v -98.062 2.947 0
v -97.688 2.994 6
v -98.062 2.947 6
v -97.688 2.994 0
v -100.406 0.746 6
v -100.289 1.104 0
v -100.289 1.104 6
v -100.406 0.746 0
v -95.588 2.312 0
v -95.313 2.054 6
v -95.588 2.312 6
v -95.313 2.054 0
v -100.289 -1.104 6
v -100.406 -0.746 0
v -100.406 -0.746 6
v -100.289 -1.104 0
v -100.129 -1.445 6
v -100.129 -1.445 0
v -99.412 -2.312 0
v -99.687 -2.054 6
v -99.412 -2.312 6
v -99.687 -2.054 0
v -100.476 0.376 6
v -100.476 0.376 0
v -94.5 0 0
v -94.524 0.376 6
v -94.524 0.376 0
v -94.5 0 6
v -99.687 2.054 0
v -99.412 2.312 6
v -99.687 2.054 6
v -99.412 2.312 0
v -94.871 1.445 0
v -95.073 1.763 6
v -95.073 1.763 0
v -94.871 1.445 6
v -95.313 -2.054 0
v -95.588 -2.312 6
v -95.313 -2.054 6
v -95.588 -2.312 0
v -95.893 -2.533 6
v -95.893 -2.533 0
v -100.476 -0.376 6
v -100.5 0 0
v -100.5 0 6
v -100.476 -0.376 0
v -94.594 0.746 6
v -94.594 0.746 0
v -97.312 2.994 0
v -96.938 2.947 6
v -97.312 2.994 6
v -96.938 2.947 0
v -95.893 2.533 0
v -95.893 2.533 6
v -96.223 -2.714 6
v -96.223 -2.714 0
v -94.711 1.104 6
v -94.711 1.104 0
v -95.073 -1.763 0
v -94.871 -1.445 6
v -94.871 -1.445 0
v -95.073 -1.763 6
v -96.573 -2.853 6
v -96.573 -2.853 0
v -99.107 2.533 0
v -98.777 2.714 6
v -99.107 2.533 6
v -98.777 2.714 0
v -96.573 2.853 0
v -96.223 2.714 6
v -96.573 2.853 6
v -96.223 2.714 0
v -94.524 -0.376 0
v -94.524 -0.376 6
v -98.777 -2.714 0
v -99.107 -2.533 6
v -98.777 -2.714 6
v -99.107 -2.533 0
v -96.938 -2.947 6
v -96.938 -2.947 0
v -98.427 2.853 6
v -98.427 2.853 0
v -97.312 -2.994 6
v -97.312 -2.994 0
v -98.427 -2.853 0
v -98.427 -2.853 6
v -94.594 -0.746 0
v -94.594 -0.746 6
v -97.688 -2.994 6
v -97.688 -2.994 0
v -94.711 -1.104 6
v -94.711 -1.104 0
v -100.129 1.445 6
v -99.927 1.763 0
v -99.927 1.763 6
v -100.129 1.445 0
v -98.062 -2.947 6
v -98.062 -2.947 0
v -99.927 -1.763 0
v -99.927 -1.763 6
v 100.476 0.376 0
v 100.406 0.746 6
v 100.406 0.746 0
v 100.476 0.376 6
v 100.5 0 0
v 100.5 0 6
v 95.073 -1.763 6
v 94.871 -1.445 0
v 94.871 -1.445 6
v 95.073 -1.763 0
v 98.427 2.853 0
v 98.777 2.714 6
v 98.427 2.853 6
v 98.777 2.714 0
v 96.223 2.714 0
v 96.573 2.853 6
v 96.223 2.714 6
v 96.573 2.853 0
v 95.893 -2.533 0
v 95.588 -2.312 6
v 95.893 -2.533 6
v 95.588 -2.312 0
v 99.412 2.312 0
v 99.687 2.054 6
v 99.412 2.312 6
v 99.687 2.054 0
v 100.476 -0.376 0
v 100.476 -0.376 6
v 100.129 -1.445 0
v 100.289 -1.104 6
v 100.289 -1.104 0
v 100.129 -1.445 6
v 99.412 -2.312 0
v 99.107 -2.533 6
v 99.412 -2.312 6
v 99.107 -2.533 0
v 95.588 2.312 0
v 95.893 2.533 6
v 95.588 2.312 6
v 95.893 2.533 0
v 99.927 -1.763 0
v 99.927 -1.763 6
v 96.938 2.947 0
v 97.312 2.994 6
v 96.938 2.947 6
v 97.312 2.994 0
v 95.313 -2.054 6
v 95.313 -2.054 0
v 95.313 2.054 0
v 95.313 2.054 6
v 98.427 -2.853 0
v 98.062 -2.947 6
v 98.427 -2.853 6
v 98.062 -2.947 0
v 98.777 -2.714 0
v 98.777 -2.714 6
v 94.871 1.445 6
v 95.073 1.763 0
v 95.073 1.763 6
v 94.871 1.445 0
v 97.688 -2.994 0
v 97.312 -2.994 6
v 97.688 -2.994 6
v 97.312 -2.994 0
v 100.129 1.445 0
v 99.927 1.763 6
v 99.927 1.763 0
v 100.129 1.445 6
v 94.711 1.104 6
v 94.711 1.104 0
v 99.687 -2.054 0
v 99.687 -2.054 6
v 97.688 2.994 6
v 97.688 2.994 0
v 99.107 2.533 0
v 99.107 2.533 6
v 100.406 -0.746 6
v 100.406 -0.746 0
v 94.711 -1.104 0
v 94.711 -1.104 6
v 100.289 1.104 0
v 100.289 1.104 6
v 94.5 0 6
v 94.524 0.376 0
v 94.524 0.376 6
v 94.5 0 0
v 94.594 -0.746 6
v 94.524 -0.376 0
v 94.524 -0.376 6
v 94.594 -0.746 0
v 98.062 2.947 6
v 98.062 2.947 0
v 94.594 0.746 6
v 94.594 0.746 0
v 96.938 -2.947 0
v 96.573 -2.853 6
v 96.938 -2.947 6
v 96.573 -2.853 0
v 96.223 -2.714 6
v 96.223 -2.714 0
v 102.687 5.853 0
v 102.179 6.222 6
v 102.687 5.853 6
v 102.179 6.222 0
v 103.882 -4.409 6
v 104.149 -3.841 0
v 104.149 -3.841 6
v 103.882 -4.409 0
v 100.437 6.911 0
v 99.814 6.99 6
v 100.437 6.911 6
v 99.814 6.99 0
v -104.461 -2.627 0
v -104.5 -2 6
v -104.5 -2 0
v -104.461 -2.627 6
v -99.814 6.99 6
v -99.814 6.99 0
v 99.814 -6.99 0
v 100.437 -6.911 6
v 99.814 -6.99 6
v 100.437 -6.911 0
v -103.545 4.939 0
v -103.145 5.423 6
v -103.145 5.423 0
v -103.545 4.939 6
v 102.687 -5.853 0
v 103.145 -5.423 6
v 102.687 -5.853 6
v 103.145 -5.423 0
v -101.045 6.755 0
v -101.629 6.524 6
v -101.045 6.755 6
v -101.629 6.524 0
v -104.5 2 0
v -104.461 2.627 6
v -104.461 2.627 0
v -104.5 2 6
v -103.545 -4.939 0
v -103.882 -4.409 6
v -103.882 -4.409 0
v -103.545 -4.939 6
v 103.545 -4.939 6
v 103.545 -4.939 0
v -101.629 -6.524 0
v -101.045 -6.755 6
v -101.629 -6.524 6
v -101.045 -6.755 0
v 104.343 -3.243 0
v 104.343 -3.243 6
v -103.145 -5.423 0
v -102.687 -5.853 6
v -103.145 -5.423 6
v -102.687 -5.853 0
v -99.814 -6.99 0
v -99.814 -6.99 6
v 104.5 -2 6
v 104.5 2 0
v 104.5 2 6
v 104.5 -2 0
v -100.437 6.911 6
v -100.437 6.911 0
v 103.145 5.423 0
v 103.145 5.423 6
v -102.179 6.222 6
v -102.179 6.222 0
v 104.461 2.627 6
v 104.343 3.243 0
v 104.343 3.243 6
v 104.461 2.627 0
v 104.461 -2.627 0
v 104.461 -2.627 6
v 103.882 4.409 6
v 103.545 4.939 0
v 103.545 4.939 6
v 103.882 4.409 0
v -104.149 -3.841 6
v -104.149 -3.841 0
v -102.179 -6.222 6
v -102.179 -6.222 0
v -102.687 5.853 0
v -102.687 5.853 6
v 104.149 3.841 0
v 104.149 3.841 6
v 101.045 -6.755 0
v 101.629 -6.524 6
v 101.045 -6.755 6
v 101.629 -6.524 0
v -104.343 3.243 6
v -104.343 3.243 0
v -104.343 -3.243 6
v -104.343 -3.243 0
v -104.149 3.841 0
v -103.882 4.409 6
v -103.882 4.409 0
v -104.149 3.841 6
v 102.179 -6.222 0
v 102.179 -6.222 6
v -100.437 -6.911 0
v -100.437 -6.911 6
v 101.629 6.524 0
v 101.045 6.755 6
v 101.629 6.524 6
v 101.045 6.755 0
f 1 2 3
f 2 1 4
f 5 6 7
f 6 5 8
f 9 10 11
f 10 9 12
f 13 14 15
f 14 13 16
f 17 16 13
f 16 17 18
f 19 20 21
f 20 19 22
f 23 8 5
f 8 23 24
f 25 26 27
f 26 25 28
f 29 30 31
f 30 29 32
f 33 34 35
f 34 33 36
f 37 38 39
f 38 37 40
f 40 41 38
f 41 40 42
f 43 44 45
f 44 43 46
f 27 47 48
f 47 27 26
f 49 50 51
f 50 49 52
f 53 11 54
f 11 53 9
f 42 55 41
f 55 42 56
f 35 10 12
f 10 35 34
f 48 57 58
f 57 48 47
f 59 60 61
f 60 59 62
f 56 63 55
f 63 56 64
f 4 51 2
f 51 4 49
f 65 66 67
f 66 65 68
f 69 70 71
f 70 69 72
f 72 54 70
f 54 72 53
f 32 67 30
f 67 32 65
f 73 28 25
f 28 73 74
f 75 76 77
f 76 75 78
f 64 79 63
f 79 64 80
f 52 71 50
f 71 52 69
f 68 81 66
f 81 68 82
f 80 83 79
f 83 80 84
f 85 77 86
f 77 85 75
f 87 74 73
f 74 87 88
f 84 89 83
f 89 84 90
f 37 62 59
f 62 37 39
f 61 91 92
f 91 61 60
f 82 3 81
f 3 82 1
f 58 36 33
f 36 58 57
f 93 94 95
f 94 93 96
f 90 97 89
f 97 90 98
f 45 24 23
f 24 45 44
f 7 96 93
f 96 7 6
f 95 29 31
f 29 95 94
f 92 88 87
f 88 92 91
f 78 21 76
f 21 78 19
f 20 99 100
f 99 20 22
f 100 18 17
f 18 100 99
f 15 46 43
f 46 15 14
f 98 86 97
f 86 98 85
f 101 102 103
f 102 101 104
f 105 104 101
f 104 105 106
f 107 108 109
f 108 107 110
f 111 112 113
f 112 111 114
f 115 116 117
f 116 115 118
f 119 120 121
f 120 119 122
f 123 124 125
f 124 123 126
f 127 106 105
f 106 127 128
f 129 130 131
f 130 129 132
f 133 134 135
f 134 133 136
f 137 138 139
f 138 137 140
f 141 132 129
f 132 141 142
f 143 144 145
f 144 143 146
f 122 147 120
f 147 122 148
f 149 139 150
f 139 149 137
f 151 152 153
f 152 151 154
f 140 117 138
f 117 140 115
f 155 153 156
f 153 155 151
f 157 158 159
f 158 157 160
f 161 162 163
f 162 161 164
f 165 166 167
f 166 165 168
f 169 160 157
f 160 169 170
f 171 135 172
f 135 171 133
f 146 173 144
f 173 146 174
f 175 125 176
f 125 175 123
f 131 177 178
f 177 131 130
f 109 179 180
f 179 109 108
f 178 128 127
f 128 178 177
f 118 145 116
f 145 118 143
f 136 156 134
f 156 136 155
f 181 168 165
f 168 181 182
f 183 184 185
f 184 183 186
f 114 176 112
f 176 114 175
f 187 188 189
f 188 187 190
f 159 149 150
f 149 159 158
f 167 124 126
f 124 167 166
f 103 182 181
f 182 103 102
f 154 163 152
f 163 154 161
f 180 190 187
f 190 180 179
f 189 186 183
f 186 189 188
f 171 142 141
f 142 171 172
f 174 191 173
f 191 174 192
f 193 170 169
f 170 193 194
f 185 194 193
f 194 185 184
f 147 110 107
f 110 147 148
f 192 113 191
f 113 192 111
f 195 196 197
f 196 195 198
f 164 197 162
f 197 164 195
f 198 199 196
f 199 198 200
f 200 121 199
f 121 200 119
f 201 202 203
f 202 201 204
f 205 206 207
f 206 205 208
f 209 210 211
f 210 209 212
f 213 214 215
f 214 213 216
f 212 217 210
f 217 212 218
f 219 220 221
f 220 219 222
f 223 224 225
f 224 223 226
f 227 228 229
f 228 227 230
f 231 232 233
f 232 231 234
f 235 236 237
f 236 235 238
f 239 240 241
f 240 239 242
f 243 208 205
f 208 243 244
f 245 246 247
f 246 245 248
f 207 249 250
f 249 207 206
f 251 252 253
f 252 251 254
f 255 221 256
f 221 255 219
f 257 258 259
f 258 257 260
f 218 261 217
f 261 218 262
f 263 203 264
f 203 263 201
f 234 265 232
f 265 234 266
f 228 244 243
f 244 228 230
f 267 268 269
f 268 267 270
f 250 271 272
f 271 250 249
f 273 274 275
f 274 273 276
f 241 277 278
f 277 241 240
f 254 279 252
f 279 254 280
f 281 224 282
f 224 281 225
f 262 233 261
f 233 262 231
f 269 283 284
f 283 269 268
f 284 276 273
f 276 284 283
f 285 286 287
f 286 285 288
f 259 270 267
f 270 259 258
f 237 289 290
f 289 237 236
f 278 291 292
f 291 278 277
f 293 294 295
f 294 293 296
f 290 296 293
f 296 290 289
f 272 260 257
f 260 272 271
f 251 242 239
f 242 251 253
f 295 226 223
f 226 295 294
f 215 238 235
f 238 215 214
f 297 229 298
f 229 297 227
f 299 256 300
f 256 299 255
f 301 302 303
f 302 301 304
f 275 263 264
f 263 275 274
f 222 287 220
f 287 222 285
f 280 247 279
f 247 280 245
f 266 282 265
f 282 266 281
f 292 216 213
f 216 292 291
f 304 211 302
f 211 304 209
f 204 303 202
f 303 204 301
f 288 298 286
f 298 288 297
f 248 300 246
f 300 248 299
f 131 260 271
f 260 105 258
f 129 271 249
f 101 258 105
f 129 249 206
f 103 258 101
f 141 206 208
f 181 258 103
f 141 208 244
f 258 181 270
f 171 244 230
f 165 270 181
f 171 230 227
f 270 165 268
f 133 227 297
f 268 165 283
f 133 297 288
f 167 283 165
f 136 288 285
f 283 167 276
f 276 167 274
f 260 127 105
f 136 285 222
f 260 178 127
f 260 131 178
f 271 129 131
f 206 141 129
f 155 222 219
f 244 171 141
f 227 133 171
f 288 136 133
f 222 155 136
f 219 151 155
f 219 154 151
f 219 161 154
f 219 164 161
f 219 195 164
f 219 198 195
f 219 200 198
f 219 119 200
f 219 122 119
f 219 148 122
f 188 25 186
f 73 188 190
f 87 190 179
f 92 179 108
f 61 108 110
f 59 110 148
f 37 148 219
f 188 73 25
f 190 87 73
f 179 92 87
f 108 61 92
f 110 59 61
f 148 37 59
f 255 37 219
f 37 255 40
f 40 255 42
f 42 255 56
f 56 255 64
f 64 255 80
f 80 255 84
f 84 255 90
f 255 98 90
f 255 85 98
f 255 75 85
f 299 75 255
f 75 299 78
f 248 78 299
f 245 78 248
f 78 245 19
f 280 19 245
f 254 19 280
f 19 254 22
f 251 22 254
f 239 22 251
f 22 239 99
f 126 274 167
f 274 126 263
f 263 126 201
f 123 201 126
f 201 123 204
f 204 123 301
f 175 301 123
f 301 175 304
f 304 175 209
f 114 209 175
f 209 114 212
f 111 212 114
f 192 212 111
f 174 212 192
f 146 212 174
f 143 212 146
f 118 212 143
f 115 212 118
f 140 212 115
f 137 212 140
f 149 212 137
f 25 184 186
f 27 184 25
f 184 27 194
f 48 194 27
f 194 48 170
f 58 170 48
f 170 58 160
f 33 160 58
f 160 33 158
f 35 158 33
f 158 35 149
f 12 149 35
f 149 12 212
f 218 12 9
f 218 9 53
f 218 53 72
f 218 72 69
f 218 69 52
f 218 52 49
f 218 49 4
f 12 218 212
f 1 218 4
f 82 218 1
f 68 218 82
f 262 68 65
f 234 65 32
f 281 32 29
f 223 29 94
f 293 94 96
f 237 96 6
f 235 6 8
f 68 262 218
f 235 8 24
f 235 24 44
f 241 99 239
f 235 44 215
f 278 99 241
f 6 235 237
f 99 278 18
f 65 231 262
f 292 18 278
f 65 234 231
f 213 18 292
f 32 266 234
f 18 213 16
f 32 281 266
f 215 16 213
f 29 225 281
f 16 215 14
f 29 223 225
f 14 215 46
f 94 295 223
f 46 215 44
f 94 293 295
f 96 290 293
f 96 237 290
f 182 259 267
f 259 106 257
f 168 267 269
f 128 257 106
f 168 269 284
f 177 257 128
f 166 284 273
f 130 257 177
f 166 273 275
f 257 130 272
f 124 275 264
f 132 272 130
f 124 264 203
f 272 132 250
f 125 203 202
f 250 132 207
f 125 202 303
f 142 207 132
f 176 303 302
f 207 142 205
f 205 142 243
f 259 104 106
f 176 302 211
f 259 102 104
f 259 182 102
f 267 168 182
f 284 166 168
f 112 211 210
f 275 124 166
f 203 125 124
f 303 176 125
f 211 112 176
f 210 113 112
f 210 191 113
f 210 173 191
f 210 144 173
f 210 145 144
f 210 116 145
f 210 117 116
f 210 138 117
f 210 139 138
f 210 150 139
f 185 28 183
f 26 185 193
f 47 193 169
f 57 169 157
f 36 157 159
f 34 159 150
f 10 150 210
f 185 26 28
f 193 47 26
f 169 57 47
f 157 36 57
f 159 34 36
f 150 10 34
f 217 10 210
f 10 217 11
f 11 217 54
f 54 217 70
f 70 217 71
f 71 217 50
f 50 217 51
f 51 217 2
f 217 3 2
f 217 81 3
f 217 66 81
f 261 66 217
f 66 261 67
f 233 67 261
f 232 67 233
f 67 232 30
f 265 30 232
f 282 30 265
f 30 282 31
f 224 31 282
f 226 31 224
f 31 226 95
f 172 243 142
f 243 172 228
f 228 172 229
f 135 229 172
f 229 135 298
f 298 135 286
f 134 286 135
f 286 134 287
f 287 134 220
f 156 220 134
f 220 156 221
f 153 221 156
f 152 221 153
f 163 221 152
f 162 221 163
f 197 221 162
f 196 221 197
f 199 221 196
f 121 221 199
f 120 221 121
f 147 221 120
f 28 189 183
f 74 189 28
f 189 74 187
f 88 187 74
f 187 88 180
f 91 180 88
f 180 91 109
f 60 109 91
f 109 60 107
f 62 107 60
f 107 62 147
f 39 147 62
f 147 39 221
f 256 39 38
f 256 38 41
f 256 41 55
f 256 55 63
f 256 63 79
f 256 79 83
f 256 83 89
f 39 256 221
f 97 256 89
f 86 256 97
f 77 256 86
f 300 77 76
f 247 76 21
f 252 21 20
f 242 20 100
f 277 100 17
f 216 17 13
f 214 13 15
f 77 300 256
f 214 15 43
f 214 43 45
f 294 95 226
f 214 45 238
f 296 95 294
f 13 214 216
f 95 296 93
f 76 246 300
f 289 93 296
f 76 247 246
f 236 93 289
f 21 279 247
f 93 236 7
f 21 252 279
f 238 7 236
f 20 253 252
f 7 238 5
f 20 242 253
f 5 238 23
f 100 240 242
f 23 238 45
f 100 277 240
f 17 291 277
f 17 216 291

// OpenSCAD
$fn = 50;


difference() {
	union() {
		hull() {
			translate(v = [-99.5000000000, 2.0000000000, 0]) {
				cylinder(h = 6, r = 5);
			}
			translate(v = [99.5000000000, 2.0000000000, 0]) {
				cylinder(h = 6, r = 5);
			}
			translate(v = [-99.5000000000, -2.0000000000, 0]) {
				cylinder(h = 6, r = 5);
			}
			translate(v = [99.5000000000, -2.0000000000, 0]) {
				cylinder(h = 6, r = 5);
			}
		}
	}
	union() {
		translate(v = [-97.5000000000, 0.0000000000, -100.0000000000]) {
			cylinder(h = 200, r = 3.0000000000);
		}
		translate(v = [-97.5000000000, 0.0000000000, -100.0000000000]) {
			cylinder(h = 200, r = 3.0000000000);
		}
		translate(v = [97.5000000000, 0.0000000000, -100.0000000000]) {
			cylinder(h = 200, r = 3.0000000000);
		}
		translate(v = [97.5000000000, 0.0000000000, -100.0000000000]) {
			cylinder(h = 200, r = 3.0000000000);
		}
	}
}
